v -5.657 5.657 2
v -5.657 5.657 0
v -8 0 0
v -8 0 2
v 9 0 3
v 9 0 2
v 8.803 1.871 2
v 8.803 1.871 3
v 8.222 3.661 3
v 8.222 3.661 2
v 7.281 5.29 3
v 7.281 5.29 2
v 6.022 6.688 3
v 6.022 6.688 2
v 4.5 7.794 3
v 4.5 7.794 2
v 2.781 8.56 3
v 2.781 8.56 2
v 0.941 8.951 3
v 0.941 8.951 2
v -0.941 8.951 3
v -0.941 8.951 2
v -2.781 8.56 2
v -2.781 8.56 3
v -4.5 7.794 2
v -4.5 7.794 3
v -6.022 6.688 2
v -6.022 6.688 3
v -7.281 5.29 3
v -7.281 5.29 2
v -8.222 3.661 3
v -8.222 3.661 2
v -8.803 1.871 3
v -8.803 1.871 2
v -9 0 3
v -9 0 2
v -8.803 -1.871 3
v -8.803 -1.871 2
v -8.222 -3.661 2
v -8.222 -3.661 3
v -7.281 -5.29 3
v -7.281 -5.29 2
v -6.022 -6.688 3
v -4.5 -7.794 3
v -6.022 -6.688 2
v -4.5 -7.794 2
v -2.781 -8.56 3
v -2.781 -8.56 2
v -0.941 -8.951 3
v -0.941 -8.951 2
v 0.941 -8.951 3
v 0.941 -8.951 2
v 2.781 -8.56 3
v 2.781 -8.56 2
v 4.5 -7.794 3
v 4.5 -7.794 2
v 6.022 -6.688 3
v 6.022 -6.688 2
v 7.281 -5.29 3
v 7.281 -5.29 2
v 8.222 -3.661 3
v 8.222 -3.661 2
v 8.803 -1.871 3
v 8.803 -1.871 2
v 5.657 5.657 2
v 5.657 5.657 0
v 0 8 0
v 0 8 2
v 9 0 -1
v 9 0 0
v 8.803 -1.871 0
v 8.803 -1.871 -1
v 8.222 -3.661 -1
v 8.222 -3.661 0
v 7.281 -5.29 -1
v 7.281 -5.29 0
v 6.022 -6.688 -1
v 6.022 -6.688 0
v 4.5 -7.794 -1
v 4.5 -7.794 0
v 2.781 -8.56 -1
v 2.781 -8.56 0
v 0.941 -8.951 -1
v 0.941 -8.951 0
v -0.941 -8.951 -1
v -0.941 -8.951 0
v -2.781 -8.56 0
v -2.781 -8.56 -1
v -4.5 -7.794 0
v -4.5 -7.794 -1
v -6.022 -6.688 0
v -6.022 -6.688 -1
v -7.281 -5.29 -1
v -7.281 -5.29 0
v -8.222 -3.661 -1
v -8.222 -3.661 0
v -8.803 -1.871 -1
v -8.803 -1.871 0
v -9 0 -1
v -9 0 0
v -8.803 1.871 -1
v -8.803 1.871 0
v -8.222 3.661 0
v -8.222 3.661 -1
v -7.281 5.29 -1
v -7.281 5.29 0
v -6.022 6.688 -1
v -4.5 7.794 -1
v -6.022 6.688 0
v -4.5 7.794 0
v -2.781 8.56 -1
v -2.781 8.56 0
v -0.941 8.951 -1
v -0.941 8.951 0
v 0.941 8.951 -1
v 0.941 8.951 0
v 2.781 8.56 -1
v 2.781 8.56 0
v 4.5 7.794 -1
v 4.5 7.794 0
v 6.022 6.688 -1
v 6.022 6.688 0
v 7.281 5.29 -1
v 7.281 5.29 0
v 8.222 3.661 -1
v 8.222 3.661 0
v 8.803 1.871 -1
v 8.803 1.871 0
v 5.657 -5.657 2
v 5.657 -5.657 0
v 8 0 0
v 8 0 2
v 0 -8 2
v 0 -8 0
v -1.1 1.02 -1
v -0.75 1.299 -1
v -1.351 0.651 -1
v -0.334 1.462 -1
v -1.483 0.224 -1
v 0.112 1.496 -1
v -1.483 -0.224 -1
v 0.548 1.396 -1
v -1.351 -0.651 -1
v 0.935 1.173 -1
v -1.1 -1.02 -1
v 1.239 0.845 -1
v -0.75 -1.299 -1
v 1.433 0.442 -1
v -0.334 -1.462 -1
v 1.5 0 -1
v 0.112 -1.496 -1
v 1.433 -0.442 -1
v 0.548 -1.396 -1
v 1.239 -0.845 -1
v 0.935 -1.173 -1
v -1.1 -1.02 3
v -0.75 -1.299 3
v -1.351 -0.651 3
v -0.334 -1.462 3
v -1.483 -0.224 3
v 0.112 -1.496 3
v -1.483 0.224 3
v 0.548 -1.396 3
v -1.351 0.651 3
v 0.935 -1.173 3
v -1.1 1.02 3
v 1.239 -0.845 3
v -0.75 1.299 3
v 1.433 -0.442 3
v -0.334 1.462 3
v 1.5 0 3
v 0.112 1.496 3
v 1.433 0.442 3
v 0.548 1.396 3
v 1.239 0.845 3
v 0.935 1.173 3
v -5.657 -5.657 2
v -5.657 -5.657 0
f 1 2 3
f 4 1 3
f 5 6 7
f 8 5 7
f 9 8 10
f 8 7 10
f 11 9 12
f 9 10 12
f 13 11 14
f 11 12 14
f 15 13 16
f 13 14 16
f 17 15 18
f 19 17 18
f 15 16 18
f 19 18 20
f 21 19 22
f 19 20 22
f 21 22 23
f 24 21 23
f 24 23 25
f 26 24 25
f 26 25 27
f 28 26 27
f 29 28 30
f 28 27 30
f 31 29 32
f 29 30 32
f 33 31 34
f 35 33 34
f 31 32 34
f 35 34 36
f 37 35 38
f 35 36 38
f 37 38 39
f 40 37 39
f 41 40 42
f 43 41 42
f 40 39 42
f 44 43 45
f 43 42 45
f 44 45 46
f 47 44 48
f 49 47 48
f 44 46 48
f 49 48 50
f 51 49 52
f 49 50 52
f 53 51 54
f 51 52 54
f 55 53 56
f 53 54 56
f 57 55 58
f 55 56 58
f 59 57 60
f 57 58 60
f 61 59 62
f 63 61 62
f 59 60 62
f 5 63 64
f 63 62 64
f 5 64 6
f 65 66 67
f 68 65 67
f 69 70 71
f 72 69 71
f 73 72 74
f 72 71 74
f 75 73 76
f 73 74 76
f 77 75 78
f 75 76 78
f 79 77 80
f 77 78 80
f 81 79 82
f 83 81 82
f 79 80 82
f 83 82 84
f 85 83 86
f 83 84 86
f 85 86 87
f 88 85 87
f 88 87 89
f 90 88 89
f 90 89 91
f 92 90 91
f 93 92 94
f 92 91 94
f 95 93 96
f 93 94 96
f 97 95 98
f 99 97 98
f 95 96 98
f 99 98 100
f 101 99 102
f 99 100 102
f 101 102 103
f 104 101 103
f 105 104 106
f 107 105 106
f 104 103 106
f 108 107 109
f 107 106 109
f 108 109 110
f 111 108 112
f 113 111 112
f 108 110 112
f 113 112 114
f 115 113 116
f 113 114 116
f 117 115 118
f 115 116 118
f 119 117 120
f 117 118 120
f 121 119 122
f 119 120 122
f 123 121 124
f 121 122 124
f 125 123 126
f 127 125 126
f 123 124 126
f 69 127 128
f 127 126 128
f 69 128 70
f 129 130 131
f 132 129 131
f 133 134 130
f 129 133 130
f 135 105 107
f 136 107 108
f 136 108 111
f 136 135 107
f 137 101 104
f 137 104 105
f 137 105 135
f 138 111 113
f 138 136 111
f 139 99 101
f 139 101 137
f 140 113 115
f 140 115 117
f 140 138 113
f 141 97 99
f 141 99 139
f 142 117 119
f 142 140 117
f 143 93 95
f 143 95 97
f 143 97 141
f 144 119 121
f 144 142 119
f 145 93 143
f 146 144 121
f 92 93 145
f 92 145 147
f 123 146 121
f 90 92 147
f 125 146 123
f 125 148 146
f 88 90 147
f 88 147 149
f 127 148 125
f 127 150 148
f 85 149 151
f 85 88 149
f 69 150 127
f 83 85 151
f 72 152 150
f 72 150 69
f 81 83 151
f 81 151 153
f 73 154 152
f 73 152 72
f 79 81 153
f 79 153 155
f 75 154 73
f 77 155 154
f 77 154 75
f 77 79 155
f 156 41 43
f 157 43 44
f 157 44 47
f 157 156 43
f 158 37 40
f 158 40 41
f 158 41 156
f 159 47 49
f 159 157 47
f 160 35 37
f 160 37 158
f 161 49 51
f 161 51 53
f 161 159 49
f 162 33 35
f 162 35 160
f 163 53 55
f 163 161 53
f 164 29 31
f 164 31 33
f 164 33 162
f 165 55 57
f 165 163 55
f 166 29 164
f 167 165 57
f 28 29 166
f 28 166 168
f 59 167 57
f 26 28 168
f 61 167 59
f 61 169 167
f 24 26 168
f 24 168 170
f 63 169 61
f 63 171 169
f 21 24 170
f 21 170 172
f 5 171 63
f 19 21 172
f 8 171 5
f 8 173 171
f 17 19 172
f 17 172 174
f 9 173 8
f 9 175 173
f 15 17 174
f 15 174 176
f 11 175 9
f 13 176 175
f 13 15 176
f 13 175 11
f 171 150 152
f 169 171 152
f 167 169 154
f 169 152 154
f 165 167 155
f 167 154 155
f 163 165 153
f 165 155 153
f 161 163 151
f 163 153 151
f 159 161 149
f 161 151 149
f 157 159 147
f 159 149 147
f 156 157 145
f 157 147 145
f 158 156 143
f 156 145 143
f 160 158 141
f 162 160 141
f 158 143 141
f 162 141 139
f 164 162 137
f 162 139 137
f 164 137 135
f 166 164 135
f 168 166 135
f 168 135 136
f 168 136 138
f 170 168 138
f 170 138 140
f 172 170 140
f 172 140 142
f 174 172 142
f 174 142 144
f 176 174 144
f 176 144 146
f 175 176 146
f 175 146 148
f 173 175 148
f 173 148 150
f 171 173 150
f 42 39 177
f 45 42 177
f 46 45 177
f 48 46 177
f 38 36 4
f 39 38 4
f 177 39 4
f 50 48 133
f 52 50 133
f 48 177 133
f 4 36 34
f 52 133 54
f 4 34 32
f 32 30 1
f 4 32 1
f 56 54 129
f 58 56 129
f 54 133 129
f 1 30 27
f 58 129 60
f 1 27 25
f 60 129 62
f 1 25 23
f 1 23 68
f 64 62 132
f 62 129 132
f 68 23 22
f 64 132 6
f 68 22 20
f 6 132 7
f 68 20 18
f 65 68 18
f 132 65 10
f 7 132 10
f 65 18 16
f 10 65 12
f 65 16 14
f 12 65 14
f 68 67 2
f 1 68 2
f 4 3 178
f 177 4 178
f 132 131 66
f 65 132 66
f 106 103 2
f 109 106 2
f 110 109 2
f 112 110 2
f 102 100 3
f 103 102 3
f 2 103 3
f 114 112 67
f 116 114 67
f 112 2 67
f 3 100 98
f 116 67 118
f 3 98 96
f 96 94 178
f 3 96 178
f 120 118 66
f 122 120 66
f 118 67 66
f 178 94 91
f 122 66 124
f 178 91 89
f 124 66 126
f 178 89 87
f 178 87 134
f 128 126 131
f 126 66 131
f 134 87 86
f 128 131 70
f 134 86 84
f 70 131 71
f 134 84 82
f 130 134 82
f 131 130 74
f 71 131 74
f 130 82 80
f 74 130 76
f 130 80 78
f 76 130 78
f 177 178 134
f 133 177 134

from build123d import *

# Parameters (mm, degrees)
PAD_DEPTH    = 2
SKETCH001_R  = 9
PAD001_DEPTH = 1
SKETCH002_R  = 9
PAD002_DEPTH = 1
SKETCH003_R  = 1.5
POCKET_DEPTH = 5


with BuildPart() as part:
    # Sketch → Pad (new body)
    with BuildSketch(Plane.XY):
        Polygon((0, 8), (-5.656854, 5.656854), (-8, 0), (-5.656854, -5.656854), (0, -8), (5.656854, -5.656854), (8, 0), (5.656854, 5.656854), align=None)
    extrude(amount=PAD_DEPTH)

    # Sketch001 (on Face10 of Pad) → Pad001 (join)
    with BuildSketch(Plane.XY.offset(2)):
        Circle(SKETCH001_R)
    extrude(amount=PAD001_DEPTH)

    # Sketch002 (on Face12 of Pad001) → Pad002 (join)
    with BuildSketch(Plane(origin=(0, 0, 0), x_dir=(1, 0, 0), z_dir=(0, 0, -1))):
        Circle(SKETCH002_R)
    extrude(amount=PAD002_DEPTH)

    # Sketch003 (on Face3 of Pad002) → Pocket (cut)
    with BuildSketch(Plane(origin=(0, 0, -1), x_dir=(1, 0, 0), z_dir=(0, 0, -1))):
        Circle(SKETCH003_R)
    extrude(amount=-POCKET_DEPTH, mode=Mode.SUBTRACT)


solid = part.part
